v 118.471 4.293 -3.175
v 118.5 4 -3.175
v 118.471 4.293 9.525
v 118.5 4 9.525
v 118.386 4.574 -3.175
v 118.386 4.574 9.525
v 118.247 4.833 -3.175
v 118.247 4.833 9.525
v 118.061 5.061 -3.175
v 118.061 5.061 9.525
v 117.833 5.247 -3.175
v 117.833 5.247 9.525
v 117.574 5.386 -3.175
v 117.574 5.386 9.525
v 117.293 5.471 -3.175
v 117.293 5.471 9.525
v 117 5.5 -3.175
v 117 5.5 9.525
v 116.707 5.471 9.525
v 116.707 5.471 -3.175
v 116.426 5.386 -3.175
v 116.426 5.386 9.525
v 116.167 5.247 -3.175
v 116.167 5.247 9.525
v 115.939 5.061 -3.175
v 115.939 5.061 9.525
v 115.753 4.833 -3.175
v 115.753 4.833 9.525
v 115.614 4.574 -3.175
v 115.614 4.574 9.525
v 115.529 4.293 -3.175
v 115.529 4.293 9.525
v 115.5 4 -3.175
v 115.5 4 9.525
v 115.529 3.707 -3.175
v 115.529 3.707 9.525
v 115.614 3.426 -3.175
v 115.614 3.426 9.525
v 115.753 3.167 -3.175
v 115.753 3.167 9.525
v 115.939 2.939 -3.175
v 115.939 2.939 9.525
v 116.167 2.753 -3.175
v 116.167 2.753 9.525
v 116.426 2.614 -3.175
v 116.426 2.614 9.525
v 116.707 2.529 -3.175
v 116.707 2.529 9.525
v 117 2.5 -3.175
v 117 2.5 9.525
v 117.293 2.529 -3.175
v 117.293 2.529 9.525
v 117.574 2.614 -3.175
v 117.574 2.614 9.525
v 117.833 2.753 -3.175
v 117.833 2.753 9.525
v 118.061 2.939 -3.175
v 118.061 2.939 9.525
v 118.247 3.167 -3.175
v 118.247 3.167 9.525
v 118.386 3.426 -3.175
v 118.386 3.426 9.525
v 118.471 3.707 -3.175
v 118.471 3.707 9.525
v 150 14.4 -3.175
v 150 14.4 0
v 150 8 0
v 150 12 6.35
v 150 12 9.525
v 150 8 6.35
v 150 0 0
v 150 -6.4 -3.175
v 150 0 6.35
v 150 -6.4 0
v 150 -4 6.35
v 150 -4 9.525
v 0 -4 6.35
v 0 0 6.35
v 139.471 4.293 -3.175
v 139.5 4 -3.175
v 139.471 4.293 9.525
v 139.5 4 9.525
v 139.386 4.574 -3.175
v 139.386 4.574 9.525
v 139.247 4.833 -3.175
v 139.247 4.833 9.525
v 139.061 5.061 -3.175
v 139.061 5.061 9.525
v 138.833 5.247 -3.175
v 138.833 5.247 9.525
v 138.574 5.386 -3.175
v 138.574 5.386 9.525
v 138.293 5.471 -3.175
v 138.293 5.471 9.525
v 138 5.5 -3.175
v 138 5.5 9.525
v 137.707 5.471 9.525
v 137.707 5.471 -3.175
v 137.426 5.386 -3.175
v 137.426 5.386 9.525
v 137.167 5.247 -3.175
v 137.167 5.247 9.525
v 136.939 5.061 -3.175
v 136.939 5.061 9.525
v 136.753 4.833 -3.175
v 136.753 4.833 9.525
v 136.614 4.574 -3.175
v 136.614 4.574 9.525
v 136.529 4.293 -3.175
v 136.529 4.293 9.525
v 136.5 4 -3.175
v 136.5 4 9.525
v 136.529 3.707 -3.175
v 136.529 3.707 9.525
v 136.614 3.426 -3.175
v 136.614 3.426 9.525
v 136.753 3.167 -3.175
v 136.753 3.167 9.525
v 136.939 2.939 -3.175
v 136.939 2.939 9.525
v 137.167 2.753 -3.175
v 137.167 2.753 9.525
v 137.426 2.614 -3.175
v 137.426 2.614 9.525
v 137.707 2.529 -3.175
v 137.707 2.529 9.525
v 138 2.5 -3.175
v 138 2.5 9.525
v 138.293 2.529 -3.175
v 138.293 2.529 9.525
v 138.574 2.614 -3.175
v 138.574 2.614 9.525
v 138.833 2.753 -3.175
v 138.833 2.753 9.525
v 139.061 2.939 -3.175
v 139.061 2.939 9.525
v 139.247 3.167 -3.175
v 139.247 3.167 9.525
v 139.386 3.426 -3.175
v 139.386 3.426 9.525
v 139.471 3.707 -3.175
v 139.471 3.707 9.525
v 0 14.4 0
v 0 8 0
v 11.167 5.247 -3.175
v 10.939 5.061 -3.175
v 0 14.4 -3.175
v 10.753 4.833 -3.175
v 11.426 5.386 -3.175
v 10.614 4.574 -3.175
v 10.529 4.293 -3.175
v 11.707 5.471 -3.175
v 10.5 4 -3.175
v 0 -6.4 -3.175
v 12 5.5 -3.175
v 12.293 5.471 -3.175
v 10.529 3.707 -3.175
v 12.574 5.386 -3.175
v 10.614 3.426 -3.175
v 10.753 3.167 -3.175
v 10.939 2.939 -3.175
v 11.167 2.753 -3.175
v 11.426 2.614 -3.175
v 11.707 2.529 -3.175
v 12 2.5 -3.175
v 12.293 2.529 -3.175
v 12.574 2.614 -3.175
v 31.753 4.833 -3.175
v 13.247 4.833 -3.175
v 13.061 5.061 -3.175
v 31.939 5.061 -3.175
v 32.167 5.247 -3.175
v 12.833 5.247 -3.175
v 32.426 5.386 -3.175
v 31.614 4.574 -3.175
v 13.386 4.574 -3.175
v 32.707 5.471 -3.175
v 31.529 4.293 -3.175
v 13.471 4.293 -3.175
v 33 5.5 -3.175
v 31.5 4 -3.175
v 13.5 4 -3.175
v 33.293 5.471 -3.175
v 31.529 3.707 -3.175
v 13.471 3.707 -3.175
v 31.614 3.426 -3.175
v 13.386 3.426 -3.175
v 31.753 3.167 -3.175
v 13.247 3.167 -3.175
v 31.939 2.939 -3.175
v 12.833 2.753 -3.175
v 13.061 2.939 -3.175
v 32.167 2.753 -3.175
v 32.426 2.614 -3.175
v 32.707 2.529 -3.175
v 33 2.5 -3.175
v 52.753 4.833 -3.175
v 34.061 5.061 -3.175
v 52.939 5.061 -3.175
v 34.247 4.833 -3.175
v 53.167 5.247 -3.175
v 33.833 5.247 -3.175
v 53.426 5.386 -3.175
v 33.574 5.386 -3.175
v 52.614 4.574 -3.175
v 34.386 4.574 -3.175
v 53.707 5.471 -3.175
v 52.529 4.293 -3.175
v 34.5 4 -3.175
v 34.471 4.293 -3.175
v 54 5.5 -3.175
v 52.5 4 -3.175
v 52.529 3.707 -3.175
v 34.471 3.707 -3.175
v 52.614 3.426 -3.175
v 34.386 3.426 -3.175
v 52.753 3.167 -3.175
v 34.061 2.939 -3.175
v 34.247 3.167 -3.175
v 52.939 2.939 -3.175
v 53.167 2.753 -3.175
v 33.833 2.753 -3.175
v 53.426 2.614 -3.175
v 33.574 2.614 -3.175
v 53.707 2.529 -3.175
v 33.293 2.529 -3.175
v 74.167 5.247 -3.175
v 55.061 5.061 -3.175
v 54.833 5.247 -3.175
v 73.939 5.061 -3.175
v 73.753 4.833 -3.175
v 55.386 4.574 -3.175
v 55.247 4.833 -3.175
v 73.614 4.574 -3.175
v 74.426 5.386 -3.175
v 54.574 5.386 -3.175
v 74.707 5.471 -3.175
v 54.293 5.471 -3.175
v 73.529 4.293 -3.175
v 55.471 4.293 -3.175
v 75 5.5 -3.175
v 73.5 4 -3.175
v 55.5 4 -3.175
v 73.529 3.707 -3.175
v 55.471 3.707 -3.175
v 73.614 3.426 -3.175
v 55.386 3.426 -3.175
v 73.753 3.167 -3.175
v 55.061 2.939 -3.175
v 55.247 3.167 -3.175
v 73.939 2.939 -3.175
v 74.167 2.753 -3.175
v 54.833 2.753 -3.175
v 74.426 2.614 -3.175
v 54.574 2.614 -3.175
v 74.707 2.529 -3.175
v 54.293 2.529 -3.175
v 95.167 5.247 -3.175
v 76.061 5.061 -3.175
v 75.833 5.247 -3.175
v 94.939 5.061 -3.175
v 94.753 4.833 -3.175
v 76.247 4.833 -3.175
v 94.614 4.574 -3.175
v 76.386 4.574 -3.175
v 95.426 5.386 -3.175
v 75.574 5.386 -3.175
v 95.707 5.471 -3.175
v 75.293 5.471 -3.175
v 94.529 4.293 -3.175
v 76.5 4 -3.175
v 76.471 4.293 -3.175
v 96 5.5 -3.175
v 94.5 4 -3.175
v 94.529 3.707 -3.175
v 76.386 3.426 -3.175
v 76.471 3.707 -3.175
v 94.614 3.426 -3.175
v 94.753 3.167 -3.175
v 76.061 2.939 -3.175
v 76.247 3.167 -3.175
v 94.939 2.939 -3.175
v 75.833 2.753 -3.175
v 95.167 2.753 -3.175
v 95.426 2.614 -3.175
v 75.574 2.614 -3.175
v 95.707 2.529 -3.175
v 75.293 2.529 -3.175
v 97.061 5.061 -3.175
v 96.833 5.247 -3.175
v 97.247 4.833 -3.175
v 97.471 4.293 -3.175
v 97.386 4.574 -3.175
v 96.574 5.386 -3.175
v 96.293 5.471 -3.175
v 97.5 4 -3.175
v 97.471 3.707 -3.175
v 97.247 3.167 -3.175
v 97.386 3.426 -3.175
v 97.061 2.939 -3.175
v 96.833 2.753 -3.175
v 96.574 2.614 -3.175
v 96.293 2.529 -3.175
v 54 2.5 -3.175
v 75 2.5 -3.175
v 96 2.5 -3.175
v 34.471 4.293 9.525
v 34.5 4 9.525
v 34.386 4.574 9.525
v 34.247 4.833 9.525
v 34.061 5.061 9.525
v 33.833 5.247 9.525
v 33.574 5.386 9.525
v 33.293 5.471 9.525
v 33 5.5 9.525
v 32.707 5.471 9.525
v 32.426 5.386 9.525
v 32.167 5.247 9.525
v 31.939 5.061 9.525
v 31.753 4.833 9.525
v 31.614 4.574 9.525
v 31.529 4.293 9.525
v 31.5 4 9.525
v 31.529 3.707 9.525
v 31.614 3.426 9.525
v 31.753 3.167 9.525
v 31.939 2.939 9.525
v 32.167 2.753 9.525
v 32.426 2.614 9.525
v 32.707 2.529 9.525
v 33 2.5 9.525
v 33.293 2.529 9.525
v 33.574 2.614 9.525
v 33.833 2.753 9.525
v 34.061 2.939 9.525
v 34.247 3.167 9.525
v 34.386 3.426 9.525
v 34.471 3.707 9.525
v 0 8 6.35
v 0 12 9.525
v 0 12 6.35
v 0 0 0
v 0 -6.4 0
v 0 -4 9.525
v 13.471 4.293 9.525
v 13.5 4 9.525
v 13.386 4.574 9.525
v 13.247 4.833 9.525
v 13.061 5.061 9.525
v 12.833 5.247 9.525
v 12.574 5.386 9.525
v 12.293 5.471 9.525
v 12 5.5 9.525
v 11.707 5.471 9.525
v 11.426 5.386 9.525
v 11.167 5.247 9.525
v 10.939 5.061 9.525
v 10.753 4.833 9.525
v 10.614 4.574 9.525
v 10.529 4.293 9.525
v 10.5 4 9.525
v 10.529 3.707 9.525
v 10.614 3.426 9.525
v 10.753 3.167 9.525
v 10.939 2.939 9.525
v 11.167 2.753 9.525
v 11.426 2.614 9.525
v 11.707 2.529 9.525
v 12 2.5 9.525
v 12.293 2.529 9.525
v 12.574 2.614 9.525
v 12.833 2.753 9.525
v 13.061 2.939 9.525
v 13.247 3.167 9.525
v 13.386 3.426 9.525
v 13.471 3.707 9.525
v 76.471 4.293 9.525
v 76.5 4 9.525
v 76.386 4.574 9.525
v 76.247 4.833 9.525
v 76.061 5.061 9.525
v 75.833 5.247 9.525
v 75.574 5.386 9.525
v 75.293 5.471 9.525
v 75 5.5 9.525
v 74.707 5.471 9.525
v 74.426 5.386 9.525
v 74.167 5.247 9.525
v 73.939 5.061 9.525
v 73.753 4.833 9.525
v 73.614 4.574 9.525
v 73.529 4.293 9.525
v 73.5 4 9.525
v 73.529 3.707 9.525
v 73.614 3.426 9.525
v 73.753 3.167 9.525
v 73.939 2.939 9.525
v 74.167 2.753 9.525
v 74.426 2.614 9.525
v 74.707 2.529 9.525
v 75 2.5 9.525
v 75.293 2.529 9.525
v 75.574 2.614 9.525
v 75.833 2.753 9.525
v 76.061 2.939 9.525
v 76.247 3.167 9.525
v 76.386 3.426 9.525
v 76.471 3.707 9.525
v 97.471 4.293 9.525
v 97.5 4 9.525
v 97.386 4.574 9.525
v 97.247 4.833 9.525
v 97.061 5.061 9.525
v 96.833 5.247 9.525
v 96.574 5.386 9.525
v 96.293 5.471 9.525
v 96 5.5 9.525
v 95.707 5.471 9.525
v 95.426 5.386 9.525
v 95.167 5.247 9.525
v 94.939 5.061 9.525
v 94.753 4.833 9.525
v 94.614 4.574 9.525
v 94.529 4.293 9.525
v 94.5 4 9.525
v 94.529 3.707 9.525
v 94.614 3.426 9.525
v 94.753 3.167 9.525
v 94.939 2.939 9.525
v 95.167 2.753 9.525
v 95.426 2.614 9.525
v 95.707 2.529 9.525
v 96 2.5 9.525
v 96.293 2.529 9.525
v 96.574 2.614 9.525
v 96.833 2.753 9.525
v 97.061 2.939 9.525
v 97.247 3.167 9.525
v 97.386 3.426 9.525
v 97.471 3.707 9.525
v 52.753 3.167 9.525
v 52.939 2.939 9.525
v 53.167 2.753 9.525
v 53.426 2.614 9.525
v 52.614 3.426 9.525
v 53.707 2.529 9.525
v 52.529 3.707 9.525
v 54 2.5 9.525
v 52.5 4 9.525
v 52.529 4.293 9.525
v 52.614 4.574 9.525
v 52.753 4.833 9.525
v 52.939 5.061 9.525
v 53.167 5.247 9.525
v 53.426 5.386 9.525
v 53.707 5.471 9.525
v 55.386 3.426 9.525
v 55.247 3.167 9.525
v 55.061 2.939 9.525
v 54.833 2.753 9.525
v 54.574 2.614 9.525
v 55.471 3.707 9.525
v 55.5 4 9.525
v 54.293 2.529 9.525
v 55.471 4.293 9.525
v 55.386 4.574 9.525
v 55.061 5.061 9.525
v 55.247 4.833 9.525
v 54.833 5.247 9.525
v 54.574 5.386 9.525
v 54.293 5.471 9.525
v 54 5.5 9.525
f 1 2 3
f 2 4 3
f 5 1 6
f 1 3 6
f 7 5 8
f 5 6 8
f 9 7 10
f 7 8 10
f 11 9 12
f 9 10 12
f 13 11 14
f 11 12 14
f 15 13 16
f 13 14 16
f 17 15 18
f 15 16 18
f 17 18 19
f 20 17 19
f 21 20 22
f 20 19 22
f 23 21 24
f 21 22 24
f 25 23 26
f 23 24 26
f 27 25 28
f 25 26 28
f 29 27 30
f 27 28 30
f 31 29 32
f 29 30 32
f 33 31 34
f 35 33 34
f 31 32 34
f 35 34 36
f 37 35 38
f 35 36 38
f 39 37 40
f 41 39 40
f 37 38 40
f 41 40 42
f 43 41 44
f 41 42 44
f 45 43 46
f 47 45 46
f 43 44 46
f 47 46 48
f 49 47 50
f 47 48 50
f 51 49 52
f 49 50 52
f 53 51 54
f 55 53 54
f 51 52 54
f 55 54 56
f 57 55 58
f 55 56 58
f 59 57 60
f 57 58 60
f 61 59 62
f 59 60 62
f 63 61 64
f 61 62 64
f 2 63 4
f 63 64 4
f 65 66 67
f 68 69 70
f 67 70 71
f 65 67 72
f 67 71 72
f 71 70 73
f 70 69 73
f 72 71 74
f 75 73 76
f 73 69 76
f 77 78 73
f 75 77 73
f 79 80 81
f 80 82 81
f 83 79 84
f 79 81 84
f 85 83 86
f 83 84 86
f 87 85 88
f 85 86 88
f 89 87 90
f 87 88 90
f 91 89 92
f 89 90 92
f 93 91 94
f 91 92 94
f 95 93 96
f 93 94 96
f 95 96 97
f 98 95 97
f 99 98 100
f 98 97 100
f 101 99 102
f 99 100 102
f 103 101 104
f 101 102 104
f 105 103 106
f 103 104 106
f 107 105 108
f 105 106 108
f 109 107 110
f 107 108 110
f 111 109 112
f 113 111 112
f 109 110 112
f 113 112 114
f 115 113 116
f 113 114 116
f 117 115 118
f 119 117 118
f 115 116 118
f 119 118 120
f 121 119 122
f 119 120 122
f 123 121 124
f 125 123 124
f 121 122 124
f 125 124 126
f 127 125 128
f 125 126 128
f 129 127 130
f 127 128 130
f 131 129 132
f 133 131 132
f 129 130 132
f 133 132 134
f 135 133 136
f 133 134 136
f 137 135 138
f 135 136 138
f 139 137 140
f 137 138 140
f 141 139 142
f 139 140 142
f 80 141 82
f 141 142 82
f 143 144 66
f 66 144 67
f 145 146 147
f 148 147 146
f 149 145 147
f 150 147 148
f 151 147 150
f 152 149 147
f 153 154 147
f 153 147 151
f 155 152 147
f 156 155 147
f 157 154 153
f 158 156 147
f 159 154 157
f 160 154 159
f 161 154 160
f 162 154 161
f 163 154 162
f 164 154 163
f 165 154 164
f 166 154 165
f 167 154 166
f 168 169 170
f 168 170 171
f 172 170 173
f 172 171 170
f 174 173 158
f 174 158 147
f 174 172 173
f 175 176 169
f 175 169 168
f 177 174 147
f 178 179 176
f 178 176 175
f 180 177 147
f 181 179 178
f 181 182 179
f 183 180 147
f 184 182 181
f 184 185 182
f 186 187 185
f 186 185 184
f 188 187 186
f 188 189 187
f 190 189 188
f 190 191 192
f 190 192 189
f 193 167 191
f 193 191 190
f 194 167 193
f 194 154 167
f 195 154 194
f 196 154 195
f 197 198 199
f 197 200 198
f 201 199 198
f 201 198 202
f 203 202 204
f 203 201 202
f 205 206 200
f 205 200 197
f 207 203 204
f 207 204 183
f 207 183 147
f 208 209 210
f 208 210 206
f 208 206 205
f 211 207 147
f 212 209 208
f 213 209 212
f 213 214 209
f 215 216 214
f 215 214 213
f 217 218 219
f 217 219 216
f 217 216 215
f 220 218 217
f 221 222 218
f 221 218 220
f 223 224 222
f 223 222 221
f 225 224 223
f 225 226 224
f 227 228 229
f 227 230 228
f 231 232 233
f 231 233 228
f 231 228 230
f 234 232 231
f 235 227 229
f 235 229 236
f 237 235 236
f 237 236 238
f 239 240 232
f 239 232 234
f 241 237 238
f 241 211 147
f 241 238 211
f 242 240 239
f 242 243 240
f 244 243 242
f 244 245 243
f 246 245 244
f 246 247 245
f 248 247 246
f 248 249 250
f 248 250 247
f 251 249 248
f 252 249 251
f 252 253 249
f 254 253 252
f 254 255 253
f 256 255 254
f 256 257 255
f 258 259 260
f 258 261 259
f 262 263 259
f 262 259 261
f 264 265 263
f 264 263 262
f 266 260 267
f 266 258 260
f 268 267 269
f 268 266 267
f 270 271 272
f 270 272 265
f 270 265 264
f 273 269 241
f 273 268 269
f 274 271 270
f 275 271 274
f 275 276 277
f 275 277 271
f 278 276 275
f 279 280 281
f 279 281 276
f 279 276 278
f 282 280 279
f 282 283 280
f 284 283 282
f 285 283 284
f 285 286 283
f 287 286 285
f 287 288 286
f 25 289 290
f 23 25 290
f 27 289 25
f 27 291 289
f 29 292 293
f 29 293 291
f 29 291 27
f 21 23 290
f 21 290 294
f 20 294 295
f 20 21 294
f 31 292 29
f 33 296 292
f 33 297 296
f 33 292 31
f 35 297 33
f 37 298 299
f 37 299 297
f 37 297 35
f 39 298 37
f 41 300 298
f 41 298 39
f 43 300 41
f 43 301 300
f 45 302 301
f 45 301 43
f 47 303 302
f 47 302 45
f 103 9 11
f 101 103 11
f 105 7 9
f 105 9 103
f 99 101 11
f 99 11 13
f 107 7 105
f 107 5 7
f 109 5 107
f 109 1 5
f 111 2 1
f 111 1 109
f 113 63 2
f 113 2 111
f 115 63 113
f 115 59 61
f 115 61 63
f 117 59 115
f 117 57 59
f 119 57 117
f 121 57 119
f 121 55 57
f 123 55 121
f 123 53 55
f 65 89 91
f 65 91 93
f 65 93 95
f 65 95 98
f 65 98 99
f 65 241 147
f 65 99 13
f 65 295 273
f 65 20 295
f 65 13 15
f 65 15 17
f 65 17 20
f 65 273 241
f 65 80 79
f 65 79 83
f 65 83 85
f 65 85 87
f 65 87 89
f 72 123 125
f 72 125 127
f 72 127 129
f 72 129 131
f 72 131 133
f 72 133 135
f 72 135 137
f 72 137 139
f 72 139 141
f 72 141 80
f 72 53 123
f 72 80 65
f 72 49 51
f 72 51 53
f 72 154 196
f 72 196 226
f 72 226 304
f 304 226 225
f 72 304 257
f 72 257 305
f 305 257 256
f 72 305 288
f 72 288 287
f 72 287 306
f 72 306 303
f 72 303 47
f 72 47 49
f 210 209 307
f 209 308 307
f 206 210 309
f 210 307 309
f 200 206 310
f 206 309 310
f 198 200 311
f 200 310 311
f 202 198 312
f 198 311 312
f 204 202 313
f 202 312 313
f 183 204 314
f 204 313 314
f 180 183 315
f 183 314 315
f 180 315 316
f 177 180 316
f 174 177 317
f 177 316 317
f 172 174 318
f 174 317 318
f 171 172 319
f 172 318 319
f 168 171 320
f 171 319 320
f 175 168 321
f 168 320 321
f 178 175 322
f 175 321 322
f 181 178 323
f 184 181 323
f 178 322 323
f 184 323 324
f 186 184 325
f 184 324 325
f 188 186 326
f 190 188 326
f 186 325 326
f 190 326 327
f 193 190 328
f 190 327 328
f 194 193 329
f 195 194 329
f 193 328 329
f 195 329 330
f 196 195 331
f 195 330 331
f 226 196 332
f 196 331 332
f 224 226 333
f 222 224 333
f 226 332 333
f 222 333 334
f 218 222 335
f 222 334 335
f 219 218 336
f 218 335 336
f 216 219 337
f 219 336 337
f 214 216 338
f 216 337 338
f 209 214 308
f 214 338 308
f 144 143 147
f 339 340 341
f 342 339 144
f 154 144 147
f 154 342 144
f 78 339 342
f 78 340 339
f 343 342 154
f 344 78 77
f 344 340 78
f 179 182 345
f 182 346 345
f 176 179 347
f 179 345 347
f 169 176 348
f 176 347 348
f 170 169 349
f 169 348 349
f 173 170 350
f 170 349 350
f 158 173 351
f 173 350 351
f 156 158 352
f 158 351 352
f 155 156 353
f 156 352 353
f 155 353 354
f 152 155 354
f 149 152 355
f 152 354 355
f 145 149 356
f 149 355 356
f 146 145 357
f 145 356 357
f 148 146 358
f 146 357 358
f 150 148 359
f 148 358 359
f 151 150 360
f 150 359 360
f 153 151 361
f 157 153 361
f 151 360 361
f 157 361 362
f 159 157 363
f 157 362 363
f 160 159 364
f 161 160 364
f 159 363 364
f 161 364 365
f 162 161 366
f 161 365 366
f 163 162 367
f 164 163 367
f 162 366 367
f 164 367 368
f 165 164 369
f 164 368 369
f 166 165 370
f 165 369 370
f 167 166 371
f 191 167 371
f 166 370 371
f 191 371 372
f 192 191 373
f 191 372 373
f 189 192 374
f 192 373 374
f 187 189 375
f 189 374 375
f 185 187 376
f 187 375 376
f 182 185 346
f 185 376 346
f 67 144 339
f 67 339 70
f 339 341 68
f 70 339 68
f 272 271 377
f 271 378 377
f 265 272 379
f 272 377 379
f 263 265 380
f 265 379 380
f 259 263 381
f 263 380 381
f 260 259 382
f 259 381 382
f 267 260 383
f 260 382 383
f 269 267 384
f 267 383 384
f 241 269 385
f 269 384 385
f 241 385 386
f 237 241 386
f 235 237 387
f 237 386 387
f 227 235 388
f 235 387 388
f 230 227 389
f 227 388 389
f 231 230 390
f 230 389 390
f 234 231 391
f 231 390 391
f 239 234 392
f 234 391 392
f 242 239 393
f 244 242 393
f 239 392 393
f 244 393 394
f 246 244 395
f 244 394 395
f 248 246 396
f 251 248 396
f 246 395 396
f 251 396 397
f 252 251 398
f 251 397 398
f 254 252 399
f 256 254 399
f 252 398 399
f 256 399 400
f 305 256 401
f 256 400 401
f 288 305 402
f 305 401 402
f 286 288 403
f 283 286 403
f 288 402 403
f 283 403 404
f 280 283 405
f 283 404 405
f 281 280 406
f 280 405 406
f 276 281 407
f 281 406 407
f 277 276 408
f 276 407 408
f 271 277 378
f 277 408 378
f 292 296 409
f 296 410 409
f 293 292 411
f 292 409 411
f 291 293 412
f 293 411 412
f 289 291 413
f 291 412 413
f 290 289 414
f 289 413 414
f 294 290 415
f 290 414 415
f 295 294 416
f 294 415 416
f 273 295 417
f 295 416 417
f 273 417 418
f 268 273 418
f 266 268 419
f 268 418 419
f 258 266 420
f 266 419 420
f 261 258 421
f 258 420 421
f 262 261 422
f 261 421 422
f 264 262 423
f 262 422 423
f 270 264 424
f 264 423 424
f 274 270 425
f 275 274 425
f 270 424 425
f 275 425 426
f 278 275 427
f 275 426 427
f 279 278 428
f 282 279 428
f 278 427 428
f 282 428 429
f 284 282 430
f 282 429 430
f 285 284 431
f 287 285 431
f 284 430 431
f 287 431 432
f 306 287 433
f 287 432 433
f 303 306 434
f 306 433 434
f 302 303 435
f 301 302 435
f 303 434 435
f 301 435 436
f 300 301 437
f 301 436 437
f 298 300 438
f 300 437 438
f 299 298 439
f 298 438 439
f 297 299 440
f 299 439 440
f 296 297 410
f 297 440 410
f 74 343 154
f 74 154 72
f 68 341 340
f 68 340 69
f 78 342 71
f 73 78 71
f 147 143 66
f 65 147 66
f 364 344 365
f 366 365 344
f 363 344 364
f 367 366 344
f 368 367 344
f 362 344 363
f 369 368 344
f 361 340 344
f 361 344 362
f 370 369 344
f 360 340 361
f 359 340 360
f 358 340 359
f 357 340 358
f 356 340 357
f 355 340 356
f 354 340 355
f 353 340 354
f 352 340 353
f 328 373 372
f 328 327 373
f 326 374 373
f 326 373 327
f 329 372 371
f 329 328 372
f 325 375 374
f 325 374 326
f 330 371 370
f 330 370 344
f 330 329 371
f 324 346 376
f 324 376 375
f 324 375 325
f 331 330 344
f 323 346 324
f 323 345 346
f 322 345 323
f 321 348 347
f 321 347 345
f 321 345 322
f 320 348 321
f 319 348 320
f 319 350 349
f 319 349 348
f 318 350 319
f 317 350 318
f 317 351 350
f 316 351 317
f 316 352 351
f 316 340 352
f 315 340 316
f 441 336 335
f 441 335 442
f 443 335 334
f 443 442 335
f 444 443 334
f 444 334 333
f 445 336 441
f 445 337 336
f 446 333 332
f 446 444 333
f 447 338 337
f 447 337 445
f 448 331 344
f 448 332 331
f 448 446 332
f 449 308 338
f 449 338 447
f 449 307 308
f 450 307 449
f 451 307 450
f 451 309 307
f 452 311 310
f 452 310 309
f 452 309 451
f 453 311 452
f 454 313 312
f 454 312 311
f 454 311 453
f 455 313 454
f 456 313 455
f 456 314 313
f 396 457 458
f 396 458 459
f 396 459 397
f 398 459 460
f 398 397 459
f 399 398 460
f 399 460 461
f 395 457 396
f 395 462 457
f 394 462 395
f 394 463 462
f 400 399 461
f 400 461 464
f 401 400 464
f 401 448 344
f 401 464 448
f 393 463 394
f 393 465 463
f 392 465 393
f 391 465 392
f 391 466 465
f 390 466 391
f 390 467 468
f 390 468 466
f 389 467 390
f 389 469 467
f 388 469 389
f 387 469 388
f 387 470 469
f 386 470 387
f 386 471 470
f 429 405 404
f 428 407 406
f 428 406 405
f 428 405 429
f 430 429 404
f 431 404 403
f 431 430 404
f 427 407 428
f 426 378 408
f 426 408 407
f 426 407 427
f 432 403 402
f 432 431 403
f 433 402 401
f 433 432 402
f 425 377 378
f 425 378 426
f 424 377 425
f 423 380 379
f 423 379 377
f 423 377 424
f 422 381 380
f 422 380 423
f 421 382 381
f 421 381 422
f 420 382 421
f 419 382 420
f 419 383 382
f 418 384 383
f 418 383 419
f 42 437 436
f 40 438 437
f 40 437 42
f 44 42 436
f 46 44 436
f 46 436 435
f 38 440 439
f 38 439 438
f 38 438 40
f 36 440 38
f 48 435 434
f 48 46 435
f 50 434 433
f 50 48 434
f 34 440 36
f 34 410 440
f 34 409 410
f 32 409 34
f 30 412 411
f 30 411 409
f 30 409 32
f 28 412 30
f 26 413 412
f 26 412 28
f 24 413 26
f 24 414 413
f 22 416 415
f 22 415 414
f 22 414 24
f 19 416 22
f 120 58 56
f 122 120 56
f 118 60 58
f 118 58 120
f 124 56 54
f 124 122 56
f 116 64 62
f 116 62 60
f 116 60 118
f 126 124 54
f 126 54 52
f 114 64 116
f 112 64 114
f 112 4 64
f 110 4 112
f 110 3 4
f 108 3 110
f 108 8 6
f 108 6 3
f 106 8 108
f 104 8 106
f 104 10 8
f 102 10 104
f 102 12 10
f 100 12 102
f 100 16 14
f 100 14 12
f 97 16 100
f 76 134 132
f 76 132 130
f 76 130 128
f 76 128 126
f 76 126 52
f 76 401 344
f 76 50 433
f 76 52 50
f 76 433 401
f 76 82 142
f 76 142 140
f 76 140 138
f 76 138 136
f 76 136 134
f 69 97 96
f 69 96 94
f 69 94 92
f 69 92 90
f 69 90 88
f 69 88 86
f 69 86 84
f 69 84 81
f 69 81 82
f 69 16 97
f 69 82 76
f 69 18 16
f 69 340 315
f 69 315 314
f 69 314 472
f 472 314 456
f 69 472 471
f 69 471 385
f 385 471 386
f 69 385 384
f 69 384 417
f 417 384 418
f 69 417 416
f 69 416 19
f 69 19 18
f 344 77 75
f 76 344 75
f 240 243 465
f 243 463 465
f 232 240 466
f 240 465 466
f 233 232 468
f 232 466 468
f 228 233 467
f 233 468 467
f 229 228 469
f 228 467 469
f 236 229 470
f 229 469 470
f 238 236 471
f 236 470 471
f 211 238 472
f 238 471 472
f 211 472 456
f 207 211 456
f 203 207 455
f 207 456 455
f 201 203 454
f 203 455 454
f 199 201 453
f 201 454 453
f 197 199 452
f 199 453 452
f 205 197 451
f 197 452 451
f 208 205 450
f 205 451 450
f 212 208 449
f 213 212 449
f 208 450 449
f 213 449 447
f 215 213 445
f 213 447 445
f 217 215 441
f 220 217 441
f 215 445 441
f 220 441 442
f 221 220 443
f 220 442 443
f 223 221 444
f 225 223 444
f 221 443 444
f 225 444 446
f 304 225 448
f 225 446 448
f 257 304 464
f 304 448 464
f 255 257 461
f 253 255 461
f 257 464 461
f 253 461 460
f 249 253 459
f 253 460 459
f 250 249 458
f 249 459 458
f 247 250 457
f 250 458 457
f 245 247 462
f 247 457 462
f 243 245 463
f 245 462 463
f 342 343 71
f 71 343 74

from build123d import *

# Parameters (mm, degrees)
F0_W          = 150
F0_H          = 8
F1_DEPTH      = 6.35
F3_W          = 150
F3_H          = 16
F4_DEPTH      = 3.175
F5_W          = 150
F5_H          = 20.8
F6_DEPTH      = 3.175
F2_R          = 1.5
F7_DEPTH      = 25
F7_DEPTH_BACK = 20.1


with BuildPart() as f1:
    # F0 (on Top) → F1 (new body)
    with BuildSketch(Plane.XY):
        with Locations((75, 4)):
            Rectangle(F0_W, F0_H)
    extrude(amount=F1_DEPTH)

    # F3 (on face) → F4 (join)
    with BuildSketch(Plane.XY.offset(6.35)):
        with Locations((75, 4)):
            Rectangle(F3_W, F3_H)
    extrude(amount=F4_DEPTH)

    # F5 (on face) → F6 (join)
    with BuildSketch(Plane(origin=(0, 0, 0), x_dir=(1, 0, 0), z_dir=(0, 0, -1))):
        with Locations((75, -4)):
            Rectangle(F5_W, F5_H)
    extrude(amount=F6_DEPTH)

    # F2 (on face) → F7 (cut, two sides)
    with BuildSketch(Plane.XY.offset(6.35)) as f7_sk:
        with Locations((12, 4)):
            Circle(F2_R)
        with Locations((33, 4)):
            Circle(F2_R)
        with Locations((54, 4)):
            Circle(F2_R)
        with Locations((75, 4)):
            Circle(F2_R)
        with Locations((96, 4)):
            Circle(F2_R)
        with Locations((117, 4)):
            Circle(F2_R)
        with Locations((138, 4)):
            Circle(F2_R)
    extrude(amount=-F7_DEPTH, mode=Mode.SUBTRACT)
    extrude(f7_sk.sketch, amount=F7_DEPTH_BACK, mode=Mode.SUBTRACT)


solid = f1.part
